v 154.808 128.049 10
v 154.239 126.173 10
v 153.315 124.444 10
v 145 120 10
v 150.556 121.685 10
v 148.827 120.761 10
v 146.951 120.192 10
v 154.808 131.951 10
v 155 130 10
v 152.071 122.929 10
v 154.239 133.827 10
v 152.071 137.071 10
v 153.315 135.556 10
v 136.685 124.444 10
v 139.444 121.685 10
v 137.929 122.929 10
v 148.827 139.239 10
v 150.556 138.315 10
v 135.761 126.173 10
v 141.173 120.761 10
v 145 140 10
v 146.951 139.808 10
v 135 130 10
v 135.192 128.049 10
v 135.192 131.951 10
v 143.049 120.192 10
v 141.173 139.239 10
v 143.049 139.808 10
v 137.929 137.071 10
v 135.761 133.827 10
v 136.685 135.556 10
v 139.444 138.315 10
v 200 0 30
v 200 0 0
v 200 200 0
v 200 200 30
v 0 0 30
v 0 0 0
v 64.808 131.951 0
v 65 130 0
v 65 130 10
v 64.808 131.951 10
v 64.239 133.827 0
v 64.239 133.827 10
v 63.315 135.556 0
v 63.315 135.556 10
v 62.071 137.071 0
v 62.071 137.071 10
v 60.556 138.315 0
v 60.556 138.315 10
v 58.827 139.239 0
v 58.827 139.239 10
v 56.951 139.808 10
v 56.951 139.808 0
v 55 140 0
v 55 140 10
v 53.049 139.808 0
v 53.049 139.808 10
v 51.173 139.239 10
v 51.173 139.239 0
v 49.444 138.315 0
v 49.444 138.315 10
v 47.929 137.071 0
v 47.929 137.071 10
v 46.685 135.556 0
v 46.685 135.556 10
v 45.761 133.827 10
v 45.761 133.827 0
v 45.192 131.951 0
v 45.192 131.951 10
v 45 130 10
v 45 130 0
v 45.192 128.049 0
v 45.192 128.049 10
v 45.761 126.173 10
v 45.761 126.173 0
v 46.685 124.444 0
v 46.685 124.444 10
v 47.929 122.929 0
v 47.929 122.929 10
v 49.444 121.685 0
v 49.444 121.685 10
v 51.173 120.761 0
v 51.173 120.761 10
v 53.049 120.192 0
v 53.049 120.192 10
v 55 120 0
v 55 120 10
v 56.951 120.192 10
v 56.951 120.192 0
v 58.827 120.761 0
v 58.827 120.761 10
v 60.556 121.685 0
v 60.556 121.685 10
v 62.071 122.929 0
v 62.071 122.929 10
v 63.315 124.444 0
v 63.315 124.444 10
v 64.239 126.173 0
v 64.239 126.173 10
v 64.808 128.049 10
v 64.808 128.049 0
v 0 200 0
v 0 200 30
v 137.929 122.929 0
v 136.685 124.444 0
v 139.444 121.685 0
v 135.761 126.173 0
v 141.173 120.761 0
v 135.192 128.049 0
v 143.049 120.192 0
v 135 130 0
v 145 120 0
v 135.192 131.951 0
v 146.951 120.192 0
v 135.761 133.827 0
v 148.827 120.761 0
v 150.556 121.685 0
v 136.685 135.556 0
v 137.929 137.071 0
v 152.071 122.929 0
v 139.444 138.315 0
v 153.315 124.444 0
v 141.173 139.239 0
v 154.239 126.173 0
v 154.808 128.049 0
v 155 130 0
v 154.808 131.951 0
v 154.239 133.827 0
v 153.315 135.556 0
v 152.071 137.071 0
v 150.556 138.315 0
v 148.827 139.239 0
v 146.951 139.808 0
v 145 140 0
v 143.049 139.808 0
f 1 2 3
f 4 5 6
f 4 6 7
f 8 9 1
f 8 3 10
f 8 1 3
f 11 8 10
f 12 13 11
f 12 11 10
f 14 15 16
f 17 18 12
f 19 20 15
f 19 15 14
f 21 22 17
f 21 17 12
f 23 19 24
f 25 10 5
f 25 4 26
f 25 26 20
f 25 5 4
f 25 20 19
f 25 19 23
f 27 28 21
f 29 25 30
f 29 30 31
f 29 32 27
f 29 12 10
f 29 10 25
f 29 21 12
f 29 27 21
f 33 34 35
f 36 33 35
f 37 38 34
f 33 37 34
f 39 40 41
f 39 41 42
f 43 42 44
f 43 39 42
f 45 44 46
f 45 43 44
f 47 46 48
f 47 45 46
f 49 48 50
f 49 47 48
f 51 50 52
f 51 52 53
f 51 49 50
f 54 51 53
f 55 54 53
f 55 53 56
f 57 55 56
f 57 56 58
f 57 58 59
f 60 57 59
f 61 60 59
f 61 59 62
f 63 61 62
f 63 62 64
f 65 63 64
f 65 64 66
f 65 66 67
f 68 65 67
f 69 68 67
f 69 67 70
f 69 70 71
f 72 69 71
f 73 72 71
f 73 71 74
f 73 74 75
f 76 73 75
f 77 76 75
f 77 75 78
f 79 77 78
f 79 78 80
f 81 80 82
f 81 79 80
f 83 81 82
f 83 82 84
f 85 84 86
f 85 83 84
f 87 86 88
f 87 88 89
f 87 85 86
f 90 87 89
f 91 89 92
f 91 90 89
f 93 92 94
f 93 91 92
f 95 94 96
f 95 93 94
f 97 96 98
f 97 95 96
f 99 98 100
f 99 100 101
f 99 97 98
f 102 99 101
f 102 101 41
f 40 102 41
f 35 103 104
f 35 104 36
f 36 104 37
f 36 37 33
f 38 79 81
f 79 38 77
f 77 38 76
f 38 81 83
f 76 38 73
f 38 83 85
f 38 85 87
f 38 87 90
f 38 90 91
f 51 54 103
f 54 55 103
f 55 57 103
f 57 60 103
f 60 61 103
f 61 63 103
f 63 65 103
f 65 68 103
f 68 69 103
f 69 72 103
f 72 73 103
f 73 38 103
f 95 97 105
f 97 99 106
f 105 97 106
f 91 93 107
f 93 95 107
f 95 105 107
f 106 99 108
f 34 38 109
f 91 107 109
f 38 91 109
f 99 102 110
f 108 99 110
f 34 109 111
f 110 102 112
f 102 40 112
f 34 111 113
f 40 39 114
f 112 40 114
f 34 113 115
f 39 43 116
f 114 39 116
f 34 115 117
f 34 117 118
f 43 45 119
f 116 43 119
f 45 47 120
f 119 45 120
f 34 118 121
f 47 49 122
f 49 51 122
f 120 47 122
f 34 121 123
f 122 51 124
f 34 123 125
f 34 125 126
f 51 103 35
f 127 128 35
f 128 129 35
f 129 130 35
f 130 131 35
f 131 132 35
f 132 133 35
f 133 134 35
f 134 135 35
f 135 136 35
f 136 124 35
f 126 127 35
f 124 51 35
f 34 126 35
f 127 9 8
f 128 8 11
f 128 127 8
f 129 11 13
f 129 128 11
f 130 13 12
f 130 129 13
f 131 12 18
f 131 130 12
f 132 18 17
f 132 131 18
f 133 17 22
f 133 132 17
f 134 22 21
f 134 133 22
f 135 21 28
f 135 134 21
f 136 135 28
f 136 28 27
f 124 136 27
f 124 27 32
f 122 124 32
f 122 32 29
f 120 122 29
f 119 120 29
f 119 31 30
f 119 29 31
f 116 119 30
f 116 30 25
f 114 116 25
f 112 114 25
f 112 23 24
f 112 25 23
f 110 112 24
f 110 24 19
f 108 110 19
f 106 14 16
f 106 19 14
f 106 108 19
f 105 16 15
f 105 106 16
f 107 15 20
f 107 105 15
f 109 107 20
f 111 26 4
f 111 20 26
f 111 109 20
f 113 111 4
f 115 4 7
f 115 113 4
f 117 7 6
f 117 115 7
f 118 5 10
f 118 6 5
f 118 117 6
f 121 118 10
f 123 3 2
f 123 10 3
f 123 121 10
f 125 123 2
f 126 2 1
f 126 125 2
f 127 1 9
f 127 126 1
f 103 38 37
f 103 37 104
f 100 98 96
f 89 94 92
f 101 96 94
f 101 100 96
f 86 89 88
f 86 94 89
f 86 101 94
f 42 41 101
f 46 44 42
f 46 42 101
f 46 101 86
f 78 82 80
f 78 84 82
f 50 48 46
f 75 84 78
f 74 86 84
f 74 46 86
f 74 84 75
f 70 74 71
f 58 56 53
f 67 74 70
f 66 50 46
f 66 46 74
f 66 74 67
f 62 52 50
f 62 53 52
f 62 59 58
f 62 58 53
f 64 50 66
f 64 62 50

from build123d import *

# Parameters (mm, degrees)
SKETCH1_W           = 200
SKETCH1_H           = 200
SKETCH1_R           = 10
BOSS_EXTRUDE1_DEPTH = 30
BOSS_EXTRUDE2_START = -10
SKETCH2_R           = 10
BOSS_EXTRUDE2_DEPTH = 20


with BuildPart() as part:
    # Sketch1 → Boss-Extrude1 (new body)
    with BuildSketch(Plane.XY):
        with Locations((100, 100)):
            Rectangle(SKETCH1_W, SKETCH1_H)
        with Locations((145, 130)):
            Circle(SKETCH1_R, mode=Mode.SUBTRACT)
        with Locations((55, 130)):
            Circle(SKETCH1_R, mode=Mode.SUBTRACT)
    extrude(amount=BOSS_EXTRUDE1_DEPTH)

    # Sketch2 → Boss-Extrude2 (add)
    with BuildSketch(Plane(origin=(0, 0, 0), x_dir=(-1, 0, 0), z_dir=(0, 0, -1)).offset(BOSS_EXTRUDE2_START)):
        with Locations((-145, 130)):
            Circle(SKETCH2_R)
        with Locations((-55, 130)):
            Circle(SKETCH2_R)
    extrude(amount=-BOSS_EXTRUDE2_DEPTH)


solid = part.part
